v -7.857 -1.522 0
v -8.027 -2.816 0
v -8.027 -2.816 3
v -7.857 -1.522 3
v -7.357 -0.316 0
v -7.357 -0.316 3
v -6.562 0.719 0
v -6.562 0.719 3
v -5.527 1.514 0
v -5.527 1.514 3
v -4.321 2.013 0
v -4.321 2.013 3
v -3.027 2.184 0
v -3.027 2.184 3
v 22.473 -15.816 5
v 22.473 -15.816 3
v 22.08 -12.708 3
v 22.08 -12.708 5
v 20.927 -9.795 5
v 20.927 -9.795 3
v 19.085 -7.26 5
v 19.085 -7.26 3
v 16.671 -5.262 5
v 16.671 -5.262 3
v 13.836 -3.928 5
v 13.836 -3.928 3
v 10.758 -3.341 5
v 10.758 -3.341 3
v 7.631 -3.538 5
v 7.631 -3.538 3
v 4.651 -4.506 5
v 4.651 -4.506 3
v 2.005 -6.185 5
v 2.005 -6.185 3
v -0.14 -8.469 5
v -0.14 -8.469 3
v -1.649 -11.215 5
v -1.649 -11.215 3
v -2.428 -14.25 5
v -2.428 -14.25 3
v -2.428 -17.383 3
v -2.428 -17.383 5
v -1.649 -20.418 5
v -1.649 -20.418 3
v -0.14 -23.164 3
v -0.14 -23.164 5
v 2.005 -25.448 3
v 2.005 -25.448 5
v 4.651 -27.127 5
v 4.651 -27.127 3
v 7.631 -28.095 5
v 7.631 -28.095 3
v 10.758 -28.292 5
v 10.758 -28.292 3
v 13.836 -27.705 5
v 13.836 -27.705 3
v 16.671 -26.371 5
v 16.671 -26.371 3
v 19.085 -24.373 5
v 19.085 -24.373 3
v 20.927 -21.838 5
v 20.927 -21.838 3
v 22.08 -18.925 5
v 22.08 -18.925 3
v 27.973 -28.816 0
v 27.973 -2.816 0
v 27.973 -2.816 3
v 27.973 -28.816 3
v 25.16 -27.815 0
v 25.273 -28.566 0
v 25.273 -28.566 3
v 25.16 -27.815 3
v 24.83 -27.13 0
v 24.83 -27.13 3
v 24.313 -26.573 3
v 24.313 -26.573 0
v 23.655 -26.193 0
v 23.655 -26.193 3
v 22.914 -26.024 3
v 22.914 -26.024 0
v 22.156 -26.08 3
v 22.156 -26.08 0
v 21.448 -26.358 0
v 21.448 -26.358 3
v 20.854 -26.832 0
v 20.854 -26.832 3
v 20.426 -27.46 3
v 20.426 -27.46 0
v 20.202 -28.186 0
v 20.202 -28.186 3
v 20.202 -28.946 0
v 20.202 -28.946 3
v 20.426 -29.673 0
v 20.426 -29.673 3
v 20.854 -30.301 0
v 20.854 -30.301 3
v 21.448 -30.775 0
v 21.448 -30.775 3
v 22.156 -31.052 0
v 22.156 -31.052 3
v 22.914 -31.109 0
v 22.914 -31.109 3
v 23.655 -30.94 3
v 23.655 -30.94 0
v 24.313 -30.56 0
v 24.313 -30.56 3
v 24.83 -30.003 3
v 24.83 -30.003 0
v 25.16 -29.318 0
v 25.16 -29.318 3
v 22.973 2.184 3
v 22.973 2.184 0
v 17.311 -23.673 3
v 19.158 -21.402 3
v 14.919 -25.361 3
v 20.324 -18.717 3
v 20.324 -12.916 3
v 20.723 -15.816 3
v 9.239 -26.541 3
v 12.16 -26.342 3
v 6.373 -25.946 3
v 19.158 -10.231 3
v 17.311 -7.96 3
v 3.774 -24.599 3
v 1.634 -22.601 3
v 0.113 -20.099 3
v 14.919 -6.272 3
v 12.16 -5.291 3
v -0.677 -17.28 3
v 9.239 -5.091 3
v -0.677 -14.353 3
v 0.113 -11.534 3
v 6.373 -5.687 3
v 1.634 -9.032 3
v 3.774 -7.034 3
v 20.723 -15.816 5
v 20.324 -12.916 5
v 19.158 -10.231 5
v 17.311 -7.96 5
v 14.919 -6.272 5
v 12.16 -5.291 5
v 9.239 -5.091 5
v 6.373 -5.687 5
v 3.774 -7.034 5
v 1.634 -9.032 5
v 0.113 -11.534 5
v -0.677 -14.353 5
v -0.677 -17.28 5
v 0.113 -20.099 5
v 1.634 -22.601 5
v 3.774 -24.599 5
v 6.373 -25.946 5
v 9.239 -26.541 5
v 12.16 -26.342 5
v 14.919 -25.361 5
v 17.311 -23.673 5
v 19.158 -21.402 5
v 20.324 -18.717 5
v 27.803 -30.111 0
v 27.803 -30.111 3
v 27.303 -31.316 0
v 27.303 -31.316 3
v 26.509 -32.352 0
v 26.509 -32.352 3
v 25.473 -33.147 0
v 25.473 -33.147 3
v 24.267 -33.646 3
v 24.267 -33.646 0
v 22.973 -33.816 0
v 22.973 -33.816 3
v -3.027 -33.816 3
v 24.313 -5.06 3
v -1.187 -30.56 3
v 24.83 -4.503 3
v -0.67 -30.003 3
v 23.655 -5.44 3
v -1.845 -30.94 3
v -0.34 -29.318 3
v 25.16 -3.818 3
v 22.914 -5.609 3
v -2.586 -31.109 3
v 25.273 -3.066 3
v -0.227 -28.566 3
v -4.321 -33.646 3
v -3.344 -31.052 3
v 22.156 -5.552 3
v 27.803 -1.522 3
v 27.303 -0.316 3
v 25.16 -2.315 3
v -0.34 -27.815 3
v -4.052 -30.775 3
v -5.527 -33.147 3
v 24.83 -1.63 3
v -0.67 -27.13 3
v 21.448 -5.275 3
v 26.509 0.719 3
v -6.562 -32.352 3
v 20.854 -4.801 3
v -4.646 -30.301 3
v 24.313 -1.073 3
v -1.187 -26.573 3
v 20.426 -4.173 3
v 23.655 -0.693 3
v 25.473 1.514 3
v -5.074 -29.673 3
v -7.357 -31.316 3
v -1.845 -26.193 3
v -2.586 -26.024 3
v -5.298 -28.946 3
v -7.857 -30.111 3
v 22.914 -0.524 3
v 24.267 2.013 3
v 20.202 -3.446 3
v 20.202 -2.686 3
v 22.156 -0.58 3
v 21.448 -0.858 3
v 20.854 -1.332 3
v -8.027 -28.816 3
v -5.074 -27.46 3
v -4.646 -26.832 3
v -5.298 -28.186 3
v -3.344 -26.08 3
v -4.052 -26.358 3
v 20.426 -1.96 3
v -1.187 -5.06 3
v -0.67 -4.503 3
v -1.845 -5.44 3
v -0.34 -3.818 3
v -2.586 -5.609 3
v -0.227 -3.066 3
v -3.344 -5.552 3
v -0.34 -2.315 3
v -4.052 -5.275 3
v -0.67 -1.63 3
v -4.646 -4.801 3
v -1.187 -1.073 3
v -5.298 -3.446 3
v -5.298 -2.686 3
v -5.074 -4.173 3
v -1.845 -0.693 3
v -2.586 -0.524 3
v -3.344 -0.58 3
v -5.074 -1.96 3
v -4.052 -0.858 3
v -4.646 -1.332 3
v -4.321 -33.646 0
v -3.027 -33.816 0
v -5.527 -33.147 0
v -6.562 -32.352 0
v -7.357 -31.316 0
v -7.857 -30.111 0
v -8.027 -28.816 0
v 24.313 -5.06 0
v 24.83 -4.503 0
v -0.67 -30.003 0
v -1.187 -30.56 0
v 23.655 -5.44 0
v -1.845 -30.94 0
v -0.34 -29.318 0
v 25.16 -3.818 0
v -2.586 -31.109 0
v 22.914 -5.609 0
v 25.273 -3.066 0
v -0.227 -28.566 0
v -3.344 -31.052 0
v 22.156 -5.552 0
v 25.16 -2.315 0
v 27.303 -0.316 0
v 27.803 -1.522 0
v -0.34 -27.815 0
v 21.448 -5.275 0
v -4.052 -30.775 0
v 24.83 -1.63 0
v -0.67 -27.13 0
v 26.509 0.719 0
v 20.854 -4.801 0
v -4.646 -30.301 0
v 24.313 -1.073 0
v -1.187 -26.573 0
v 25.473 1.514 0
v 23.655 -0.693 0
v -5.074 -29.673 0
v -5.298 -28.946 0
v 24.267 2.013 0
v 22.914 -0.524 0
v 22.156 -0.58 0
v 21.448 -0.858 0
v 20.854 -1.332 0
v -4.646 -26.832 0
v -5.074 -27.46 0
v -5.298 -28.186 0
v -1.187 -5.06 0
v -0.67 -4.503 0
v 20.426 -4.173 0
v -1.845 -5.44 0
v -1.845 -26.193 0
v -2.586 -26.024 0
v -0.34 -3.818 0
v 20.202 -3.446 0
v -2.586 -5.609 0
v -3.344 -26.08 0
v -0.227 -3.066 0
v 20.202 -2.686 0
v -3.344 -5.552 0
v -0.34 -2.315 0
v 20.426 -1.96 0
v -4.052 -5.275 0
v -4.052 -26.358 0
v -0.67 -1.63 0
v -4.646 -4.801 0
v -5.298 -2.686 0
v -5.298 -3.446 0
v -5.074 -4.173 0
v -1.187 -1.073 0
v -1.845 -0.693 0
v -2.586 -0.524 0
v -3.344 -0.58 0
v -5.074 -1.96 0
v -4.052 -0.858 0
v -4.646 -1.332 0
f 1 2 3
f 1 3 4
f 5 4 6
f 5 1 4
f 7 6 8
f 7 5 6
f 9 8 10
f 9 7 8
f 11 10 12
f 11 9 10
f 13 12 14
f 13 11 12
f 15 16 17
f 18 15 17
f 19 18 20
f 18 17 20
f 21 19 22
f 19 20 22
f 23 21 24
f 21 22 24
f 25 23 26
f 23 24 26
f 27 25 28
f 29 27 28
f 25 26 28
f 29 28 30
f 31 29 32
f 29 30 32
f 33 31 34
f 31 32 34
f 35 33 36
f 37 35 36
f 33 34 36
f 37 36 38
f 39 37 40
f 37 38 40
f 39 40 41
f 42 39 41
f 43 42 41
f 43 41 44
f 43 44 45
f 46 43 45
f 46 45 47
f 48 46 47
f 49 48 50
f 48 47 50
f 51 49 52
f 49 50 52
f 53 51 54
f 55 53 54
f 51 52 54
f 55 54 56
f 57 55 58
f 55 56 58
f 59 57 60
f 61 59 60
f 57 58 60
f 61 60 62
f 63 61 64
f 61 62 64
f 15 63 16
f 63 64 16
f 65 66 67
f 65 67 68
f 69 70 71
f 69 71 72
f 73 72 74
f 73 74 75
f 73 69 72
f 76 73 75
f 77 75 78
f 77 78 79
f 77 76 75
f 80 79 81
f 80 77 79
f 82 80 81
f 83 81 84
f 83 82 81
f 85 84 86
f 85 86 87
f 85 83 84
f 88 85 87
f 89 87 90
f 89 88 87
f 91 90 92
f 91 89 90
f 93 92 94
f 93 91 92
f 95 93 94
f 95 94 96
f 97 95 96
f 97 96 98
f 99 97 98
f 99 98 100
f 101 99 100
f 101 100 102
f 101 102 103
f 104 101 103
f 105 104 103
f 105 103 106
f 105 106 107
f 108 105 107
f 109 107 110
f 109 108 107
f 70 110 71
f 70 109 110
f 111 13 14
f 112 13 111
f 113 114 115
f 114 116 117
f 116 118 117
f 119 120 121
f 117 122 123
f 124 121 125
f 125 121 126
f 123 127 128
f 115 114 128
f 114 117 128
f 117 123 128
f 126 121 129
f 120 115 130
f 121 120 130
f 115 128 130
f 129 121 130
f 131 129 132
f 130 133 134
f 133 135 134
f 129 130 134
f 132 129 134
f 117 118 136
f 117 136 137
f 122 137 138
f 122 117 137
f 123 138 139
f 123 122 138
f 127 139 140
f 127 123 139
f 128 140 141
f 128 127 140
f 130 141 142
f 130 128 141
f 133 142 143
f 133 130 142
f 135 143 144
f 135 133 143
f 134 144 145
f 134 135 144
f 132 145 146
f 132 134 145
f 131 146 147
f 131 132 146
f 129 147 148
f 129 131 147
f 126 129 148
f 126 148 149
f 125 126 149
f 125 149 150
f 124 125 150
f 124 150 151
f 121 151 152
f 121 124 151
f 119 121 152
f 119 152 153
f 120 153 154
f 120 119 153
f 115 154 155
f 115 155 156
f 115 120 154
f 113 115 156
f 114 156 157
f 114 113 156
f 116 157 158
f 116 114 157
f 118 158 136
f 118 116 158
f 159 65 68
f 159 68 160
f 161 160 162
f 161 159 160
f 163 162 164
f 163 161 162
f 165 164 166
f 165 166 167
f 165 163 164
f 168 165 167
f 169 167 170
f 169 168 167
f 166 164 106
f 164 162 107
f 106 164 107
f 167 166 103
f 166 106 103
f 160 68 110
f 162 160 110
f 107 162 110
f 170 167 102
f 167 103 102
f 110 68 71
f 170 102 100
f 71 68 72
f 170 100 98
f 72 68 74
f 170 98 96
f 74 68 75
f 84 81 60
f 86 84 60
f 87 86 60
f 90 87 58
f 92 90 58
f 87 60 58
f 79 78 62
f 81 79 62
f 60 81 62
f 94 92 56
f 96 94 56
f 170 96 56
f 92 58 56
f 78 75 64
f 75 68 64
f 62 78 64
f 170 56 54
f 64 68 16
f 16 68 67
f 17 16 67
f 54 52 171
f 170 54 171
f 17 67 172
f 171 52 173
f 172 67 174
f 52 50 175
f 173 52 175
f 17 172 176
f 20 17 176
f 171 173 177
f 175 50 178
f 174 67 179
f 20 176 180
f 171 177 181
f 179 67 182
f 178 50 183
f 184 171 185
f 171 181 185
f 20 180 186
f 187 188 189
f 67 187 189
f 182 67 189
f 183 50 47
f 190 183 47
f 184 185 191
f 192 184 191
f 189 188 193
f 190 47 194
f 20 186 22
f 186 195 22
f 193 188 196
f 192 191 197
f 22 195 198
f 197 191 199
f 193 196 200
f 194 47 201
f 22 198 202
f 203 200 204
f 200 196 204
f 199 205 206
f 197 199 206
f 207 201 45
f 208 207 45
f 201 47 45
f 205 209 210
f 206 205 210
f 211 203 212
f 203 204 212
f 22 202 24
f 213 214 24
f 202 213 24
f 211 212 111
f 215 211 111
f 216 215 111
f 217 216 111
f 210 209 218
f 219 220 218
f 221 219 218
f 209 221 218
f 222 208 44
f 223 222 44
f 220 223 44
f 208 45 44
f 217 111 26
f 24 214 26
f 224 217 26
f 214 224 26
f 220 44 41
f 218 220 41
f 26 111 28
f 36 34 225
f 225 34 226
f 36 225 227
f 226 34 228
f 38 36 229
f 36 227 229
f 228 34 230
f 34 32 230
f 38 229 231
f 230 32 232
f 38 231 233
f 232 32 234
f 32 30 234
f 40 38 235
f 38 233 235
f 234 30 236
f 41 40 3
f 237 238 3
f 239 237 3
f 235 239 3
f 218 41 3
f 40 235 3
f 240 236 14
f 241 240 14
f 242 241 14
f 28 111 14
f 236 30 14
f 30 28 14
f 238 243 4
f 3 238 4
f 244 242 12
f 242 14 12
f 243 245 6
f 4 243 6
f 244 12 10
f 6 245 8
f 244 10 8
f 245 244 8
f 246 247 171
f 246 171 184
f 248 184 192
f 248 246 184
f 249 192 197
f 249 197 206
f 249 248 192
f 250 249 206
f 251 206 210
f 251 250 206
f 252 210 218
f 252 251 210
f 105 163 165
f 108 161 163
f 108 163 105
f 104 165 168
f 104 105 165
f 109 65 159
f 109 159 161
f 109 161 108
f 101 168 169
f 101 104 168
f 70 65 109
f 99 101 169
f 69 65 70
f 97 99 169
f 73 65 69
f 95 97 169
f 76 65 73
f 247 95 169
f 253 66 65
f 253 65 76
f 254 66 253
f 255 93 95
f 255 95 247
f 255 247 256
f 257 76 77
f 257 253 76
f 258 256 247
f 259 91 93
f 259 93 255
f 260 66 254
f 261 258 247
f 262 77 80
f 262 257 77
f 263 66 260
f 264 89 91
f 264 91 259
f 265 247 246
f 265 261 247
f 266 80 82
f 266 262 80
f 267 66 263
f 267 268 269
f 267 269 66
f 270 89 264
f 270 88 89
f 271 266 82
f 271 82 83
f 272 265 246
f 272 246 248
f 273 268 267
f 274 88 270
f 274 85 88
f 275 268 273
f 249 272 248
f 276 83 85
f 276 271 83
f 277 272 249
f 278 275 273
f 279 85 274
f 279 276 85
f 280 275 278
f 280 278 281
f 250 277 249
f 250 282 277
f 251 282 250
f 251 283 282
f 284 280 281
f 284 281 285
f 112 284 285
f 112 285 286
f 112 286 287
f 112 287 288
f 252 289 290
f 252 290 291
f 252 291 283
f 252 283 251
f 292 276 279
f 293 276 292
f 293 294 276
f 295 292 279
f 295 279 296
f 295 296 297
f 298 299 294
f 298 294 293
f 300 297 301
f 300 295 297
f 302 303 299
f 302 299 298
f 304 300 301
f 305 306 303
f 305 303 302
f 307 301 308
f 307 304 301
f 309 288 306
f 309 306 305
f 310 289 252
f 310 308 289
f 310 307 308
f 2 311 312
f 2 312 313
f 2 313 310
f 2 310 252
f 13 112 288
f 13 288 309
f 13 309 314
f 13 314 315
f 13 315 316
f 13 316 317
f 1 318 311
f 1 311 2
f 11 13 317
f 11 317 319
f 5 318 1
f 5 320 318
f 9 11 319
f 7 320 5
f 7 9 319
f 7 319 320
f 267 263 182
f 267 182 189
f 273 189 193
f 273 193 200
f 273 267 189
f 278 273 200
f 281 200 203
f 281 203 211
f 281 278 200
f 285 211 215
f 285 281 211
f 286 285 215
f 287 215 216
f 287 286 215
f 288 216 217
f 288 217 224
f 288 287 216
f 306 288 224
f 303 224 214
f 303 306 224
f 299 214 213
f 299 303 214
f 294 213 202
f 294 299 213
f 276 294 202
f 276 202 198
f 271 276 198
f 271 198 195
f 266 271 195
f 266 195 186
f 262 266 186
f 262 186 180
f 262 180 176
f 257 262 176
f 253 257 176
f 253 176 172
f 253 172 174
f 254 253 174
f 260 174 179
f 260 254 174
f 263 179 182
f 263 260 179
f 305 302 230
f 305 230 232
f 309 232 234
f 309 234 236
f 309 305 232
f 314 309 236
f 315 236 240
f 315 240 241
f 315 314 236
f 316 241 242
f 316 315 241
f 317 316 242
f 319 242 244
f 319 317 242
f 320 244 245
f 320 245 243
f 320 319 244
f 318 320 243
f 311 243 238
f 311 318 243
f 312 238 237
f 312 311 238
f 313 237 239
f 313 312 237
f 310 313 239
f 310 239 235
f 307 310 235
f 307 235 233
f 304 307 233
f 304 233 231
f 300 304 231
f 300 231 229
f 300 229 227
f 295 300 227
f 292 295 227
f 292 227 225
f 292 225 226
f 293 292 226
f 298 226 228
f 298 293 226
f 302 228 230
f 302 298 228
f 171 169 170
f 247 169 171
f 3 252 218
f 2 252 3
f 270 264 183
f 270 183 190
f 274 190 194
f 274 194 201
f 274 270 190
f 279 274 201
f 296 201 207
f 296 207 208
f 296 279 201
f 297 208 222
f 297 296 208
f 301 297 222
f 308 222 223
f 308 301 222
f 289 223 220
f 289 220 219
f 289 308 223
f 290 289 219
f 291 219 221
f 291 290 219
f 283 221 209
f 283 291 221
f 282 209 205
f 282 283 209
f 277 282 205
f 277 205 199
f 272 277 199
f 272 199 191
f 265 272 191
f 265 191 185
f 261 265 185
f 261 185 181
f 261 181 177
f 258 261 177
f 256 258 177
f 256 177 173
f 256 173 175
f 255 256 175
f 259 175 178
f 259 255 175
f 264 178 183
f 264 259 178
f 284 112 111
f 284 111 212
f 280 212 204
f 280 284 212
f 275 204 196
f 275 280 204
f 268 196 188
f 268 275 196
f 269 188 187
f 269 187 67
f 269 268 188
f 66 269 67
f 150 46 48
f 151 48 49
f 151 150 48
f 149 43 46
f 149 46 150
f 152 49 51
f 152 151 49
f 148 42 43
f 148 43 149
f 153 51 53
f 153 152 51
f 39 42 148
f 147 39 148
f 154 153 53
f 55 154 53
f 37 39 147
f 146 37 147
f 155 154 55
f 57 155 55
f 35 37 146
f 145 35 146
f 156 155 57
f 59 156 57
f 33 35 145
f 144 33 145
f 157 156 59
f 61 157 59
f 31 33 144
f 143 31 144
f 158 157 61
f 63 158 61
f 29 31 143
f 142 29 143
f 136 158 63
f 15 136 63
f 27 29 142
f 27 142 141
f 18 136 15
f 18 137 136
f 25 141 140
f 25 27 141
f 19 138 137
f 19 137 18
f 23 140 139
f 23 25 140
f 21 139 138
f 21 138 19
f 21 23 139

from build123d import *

# Parameters (mm, degrees)
SZKIC1_R                     = 2.55
DODANIE_WYCI_GNI_CIE11_DEPTH = 3
SZKIC7_R                     = 12.5
SZKIC7_R_2                   = 10.75
DODANIE_WYCI_GNI_CIE12_DEPTH = 2


with BuildPart() as part:
    # Szkic1 → Dodanie-wyciągnięcie11 (new body)
    with BuildSketch(Plane.XY):
        with BuildLine():
            Line((-3.026929241, 2.183576975), (22.973070759, 2.183576975))
            ThreePointArc((22.973070759, 2.183576975), (26.508604665, 0.719110881), (27.973070759, -2.816423025))
            Line((27.973070759, -2.816423025), (27.973070759, -28.816423025))
            ThreePointArc((27.973070759, -28.816423025), (26.508604665, -32.351956931), (22.973070759, -33.816423025))
            Line((22.973070759, -33.816423025), (-3.026929241, -33.816423025))
            ThreePointArc((-3.026929241, -33.816423025), (-6.562463147, -32.351956931), (-8.026929241, -28.816423025))
            Line((-8.026929241, -28.816423025), (-8.026929241, -2.816423025))
            ThreePointArc((-8.026929241, -2.816423025), (-6.562463147, 0.719110881), (-3.026929241, 2.183576975))
        make_face()
        with Locations((-2.776929241, -3.066423025)):
            Circle(SZKIC1_R, mode=Mode.SUBTRACT)
        with Locations((22.723070759, -3.066423025)):
            Circle(SZKIC1_R, mode=Mode.SUBTRACT)
        with Locations((-2.776929241, -28.566423025)):
            Circle(SZKIC1_R, mode=Mode.SUBTRACT)
        with Locations((22.723070759, -28.566423025)):
            Circle(SZKIC1_R, mode=Mode.SUBTRACT)
    extrude(amount=DODANIE_WYCI_GNI_CIE11_DEPTH)

    # Szkic7 → Dodanie-wyciągnięcie12 (add)
    with BuildSketch(Plane.XY.offset(3)):
        with Locations((9.973070759, -15.816423025)):
            Circle(SZKIC7_R)
        with Locations((9.973070759, -15.816423025)):
            Circle(SZKIC7_R_2, mode=Mode.SUBTRACT)
    extrude(amount=DODANIE_WYCI_GNI_CIE12_DEPTH)


solid = part.part
